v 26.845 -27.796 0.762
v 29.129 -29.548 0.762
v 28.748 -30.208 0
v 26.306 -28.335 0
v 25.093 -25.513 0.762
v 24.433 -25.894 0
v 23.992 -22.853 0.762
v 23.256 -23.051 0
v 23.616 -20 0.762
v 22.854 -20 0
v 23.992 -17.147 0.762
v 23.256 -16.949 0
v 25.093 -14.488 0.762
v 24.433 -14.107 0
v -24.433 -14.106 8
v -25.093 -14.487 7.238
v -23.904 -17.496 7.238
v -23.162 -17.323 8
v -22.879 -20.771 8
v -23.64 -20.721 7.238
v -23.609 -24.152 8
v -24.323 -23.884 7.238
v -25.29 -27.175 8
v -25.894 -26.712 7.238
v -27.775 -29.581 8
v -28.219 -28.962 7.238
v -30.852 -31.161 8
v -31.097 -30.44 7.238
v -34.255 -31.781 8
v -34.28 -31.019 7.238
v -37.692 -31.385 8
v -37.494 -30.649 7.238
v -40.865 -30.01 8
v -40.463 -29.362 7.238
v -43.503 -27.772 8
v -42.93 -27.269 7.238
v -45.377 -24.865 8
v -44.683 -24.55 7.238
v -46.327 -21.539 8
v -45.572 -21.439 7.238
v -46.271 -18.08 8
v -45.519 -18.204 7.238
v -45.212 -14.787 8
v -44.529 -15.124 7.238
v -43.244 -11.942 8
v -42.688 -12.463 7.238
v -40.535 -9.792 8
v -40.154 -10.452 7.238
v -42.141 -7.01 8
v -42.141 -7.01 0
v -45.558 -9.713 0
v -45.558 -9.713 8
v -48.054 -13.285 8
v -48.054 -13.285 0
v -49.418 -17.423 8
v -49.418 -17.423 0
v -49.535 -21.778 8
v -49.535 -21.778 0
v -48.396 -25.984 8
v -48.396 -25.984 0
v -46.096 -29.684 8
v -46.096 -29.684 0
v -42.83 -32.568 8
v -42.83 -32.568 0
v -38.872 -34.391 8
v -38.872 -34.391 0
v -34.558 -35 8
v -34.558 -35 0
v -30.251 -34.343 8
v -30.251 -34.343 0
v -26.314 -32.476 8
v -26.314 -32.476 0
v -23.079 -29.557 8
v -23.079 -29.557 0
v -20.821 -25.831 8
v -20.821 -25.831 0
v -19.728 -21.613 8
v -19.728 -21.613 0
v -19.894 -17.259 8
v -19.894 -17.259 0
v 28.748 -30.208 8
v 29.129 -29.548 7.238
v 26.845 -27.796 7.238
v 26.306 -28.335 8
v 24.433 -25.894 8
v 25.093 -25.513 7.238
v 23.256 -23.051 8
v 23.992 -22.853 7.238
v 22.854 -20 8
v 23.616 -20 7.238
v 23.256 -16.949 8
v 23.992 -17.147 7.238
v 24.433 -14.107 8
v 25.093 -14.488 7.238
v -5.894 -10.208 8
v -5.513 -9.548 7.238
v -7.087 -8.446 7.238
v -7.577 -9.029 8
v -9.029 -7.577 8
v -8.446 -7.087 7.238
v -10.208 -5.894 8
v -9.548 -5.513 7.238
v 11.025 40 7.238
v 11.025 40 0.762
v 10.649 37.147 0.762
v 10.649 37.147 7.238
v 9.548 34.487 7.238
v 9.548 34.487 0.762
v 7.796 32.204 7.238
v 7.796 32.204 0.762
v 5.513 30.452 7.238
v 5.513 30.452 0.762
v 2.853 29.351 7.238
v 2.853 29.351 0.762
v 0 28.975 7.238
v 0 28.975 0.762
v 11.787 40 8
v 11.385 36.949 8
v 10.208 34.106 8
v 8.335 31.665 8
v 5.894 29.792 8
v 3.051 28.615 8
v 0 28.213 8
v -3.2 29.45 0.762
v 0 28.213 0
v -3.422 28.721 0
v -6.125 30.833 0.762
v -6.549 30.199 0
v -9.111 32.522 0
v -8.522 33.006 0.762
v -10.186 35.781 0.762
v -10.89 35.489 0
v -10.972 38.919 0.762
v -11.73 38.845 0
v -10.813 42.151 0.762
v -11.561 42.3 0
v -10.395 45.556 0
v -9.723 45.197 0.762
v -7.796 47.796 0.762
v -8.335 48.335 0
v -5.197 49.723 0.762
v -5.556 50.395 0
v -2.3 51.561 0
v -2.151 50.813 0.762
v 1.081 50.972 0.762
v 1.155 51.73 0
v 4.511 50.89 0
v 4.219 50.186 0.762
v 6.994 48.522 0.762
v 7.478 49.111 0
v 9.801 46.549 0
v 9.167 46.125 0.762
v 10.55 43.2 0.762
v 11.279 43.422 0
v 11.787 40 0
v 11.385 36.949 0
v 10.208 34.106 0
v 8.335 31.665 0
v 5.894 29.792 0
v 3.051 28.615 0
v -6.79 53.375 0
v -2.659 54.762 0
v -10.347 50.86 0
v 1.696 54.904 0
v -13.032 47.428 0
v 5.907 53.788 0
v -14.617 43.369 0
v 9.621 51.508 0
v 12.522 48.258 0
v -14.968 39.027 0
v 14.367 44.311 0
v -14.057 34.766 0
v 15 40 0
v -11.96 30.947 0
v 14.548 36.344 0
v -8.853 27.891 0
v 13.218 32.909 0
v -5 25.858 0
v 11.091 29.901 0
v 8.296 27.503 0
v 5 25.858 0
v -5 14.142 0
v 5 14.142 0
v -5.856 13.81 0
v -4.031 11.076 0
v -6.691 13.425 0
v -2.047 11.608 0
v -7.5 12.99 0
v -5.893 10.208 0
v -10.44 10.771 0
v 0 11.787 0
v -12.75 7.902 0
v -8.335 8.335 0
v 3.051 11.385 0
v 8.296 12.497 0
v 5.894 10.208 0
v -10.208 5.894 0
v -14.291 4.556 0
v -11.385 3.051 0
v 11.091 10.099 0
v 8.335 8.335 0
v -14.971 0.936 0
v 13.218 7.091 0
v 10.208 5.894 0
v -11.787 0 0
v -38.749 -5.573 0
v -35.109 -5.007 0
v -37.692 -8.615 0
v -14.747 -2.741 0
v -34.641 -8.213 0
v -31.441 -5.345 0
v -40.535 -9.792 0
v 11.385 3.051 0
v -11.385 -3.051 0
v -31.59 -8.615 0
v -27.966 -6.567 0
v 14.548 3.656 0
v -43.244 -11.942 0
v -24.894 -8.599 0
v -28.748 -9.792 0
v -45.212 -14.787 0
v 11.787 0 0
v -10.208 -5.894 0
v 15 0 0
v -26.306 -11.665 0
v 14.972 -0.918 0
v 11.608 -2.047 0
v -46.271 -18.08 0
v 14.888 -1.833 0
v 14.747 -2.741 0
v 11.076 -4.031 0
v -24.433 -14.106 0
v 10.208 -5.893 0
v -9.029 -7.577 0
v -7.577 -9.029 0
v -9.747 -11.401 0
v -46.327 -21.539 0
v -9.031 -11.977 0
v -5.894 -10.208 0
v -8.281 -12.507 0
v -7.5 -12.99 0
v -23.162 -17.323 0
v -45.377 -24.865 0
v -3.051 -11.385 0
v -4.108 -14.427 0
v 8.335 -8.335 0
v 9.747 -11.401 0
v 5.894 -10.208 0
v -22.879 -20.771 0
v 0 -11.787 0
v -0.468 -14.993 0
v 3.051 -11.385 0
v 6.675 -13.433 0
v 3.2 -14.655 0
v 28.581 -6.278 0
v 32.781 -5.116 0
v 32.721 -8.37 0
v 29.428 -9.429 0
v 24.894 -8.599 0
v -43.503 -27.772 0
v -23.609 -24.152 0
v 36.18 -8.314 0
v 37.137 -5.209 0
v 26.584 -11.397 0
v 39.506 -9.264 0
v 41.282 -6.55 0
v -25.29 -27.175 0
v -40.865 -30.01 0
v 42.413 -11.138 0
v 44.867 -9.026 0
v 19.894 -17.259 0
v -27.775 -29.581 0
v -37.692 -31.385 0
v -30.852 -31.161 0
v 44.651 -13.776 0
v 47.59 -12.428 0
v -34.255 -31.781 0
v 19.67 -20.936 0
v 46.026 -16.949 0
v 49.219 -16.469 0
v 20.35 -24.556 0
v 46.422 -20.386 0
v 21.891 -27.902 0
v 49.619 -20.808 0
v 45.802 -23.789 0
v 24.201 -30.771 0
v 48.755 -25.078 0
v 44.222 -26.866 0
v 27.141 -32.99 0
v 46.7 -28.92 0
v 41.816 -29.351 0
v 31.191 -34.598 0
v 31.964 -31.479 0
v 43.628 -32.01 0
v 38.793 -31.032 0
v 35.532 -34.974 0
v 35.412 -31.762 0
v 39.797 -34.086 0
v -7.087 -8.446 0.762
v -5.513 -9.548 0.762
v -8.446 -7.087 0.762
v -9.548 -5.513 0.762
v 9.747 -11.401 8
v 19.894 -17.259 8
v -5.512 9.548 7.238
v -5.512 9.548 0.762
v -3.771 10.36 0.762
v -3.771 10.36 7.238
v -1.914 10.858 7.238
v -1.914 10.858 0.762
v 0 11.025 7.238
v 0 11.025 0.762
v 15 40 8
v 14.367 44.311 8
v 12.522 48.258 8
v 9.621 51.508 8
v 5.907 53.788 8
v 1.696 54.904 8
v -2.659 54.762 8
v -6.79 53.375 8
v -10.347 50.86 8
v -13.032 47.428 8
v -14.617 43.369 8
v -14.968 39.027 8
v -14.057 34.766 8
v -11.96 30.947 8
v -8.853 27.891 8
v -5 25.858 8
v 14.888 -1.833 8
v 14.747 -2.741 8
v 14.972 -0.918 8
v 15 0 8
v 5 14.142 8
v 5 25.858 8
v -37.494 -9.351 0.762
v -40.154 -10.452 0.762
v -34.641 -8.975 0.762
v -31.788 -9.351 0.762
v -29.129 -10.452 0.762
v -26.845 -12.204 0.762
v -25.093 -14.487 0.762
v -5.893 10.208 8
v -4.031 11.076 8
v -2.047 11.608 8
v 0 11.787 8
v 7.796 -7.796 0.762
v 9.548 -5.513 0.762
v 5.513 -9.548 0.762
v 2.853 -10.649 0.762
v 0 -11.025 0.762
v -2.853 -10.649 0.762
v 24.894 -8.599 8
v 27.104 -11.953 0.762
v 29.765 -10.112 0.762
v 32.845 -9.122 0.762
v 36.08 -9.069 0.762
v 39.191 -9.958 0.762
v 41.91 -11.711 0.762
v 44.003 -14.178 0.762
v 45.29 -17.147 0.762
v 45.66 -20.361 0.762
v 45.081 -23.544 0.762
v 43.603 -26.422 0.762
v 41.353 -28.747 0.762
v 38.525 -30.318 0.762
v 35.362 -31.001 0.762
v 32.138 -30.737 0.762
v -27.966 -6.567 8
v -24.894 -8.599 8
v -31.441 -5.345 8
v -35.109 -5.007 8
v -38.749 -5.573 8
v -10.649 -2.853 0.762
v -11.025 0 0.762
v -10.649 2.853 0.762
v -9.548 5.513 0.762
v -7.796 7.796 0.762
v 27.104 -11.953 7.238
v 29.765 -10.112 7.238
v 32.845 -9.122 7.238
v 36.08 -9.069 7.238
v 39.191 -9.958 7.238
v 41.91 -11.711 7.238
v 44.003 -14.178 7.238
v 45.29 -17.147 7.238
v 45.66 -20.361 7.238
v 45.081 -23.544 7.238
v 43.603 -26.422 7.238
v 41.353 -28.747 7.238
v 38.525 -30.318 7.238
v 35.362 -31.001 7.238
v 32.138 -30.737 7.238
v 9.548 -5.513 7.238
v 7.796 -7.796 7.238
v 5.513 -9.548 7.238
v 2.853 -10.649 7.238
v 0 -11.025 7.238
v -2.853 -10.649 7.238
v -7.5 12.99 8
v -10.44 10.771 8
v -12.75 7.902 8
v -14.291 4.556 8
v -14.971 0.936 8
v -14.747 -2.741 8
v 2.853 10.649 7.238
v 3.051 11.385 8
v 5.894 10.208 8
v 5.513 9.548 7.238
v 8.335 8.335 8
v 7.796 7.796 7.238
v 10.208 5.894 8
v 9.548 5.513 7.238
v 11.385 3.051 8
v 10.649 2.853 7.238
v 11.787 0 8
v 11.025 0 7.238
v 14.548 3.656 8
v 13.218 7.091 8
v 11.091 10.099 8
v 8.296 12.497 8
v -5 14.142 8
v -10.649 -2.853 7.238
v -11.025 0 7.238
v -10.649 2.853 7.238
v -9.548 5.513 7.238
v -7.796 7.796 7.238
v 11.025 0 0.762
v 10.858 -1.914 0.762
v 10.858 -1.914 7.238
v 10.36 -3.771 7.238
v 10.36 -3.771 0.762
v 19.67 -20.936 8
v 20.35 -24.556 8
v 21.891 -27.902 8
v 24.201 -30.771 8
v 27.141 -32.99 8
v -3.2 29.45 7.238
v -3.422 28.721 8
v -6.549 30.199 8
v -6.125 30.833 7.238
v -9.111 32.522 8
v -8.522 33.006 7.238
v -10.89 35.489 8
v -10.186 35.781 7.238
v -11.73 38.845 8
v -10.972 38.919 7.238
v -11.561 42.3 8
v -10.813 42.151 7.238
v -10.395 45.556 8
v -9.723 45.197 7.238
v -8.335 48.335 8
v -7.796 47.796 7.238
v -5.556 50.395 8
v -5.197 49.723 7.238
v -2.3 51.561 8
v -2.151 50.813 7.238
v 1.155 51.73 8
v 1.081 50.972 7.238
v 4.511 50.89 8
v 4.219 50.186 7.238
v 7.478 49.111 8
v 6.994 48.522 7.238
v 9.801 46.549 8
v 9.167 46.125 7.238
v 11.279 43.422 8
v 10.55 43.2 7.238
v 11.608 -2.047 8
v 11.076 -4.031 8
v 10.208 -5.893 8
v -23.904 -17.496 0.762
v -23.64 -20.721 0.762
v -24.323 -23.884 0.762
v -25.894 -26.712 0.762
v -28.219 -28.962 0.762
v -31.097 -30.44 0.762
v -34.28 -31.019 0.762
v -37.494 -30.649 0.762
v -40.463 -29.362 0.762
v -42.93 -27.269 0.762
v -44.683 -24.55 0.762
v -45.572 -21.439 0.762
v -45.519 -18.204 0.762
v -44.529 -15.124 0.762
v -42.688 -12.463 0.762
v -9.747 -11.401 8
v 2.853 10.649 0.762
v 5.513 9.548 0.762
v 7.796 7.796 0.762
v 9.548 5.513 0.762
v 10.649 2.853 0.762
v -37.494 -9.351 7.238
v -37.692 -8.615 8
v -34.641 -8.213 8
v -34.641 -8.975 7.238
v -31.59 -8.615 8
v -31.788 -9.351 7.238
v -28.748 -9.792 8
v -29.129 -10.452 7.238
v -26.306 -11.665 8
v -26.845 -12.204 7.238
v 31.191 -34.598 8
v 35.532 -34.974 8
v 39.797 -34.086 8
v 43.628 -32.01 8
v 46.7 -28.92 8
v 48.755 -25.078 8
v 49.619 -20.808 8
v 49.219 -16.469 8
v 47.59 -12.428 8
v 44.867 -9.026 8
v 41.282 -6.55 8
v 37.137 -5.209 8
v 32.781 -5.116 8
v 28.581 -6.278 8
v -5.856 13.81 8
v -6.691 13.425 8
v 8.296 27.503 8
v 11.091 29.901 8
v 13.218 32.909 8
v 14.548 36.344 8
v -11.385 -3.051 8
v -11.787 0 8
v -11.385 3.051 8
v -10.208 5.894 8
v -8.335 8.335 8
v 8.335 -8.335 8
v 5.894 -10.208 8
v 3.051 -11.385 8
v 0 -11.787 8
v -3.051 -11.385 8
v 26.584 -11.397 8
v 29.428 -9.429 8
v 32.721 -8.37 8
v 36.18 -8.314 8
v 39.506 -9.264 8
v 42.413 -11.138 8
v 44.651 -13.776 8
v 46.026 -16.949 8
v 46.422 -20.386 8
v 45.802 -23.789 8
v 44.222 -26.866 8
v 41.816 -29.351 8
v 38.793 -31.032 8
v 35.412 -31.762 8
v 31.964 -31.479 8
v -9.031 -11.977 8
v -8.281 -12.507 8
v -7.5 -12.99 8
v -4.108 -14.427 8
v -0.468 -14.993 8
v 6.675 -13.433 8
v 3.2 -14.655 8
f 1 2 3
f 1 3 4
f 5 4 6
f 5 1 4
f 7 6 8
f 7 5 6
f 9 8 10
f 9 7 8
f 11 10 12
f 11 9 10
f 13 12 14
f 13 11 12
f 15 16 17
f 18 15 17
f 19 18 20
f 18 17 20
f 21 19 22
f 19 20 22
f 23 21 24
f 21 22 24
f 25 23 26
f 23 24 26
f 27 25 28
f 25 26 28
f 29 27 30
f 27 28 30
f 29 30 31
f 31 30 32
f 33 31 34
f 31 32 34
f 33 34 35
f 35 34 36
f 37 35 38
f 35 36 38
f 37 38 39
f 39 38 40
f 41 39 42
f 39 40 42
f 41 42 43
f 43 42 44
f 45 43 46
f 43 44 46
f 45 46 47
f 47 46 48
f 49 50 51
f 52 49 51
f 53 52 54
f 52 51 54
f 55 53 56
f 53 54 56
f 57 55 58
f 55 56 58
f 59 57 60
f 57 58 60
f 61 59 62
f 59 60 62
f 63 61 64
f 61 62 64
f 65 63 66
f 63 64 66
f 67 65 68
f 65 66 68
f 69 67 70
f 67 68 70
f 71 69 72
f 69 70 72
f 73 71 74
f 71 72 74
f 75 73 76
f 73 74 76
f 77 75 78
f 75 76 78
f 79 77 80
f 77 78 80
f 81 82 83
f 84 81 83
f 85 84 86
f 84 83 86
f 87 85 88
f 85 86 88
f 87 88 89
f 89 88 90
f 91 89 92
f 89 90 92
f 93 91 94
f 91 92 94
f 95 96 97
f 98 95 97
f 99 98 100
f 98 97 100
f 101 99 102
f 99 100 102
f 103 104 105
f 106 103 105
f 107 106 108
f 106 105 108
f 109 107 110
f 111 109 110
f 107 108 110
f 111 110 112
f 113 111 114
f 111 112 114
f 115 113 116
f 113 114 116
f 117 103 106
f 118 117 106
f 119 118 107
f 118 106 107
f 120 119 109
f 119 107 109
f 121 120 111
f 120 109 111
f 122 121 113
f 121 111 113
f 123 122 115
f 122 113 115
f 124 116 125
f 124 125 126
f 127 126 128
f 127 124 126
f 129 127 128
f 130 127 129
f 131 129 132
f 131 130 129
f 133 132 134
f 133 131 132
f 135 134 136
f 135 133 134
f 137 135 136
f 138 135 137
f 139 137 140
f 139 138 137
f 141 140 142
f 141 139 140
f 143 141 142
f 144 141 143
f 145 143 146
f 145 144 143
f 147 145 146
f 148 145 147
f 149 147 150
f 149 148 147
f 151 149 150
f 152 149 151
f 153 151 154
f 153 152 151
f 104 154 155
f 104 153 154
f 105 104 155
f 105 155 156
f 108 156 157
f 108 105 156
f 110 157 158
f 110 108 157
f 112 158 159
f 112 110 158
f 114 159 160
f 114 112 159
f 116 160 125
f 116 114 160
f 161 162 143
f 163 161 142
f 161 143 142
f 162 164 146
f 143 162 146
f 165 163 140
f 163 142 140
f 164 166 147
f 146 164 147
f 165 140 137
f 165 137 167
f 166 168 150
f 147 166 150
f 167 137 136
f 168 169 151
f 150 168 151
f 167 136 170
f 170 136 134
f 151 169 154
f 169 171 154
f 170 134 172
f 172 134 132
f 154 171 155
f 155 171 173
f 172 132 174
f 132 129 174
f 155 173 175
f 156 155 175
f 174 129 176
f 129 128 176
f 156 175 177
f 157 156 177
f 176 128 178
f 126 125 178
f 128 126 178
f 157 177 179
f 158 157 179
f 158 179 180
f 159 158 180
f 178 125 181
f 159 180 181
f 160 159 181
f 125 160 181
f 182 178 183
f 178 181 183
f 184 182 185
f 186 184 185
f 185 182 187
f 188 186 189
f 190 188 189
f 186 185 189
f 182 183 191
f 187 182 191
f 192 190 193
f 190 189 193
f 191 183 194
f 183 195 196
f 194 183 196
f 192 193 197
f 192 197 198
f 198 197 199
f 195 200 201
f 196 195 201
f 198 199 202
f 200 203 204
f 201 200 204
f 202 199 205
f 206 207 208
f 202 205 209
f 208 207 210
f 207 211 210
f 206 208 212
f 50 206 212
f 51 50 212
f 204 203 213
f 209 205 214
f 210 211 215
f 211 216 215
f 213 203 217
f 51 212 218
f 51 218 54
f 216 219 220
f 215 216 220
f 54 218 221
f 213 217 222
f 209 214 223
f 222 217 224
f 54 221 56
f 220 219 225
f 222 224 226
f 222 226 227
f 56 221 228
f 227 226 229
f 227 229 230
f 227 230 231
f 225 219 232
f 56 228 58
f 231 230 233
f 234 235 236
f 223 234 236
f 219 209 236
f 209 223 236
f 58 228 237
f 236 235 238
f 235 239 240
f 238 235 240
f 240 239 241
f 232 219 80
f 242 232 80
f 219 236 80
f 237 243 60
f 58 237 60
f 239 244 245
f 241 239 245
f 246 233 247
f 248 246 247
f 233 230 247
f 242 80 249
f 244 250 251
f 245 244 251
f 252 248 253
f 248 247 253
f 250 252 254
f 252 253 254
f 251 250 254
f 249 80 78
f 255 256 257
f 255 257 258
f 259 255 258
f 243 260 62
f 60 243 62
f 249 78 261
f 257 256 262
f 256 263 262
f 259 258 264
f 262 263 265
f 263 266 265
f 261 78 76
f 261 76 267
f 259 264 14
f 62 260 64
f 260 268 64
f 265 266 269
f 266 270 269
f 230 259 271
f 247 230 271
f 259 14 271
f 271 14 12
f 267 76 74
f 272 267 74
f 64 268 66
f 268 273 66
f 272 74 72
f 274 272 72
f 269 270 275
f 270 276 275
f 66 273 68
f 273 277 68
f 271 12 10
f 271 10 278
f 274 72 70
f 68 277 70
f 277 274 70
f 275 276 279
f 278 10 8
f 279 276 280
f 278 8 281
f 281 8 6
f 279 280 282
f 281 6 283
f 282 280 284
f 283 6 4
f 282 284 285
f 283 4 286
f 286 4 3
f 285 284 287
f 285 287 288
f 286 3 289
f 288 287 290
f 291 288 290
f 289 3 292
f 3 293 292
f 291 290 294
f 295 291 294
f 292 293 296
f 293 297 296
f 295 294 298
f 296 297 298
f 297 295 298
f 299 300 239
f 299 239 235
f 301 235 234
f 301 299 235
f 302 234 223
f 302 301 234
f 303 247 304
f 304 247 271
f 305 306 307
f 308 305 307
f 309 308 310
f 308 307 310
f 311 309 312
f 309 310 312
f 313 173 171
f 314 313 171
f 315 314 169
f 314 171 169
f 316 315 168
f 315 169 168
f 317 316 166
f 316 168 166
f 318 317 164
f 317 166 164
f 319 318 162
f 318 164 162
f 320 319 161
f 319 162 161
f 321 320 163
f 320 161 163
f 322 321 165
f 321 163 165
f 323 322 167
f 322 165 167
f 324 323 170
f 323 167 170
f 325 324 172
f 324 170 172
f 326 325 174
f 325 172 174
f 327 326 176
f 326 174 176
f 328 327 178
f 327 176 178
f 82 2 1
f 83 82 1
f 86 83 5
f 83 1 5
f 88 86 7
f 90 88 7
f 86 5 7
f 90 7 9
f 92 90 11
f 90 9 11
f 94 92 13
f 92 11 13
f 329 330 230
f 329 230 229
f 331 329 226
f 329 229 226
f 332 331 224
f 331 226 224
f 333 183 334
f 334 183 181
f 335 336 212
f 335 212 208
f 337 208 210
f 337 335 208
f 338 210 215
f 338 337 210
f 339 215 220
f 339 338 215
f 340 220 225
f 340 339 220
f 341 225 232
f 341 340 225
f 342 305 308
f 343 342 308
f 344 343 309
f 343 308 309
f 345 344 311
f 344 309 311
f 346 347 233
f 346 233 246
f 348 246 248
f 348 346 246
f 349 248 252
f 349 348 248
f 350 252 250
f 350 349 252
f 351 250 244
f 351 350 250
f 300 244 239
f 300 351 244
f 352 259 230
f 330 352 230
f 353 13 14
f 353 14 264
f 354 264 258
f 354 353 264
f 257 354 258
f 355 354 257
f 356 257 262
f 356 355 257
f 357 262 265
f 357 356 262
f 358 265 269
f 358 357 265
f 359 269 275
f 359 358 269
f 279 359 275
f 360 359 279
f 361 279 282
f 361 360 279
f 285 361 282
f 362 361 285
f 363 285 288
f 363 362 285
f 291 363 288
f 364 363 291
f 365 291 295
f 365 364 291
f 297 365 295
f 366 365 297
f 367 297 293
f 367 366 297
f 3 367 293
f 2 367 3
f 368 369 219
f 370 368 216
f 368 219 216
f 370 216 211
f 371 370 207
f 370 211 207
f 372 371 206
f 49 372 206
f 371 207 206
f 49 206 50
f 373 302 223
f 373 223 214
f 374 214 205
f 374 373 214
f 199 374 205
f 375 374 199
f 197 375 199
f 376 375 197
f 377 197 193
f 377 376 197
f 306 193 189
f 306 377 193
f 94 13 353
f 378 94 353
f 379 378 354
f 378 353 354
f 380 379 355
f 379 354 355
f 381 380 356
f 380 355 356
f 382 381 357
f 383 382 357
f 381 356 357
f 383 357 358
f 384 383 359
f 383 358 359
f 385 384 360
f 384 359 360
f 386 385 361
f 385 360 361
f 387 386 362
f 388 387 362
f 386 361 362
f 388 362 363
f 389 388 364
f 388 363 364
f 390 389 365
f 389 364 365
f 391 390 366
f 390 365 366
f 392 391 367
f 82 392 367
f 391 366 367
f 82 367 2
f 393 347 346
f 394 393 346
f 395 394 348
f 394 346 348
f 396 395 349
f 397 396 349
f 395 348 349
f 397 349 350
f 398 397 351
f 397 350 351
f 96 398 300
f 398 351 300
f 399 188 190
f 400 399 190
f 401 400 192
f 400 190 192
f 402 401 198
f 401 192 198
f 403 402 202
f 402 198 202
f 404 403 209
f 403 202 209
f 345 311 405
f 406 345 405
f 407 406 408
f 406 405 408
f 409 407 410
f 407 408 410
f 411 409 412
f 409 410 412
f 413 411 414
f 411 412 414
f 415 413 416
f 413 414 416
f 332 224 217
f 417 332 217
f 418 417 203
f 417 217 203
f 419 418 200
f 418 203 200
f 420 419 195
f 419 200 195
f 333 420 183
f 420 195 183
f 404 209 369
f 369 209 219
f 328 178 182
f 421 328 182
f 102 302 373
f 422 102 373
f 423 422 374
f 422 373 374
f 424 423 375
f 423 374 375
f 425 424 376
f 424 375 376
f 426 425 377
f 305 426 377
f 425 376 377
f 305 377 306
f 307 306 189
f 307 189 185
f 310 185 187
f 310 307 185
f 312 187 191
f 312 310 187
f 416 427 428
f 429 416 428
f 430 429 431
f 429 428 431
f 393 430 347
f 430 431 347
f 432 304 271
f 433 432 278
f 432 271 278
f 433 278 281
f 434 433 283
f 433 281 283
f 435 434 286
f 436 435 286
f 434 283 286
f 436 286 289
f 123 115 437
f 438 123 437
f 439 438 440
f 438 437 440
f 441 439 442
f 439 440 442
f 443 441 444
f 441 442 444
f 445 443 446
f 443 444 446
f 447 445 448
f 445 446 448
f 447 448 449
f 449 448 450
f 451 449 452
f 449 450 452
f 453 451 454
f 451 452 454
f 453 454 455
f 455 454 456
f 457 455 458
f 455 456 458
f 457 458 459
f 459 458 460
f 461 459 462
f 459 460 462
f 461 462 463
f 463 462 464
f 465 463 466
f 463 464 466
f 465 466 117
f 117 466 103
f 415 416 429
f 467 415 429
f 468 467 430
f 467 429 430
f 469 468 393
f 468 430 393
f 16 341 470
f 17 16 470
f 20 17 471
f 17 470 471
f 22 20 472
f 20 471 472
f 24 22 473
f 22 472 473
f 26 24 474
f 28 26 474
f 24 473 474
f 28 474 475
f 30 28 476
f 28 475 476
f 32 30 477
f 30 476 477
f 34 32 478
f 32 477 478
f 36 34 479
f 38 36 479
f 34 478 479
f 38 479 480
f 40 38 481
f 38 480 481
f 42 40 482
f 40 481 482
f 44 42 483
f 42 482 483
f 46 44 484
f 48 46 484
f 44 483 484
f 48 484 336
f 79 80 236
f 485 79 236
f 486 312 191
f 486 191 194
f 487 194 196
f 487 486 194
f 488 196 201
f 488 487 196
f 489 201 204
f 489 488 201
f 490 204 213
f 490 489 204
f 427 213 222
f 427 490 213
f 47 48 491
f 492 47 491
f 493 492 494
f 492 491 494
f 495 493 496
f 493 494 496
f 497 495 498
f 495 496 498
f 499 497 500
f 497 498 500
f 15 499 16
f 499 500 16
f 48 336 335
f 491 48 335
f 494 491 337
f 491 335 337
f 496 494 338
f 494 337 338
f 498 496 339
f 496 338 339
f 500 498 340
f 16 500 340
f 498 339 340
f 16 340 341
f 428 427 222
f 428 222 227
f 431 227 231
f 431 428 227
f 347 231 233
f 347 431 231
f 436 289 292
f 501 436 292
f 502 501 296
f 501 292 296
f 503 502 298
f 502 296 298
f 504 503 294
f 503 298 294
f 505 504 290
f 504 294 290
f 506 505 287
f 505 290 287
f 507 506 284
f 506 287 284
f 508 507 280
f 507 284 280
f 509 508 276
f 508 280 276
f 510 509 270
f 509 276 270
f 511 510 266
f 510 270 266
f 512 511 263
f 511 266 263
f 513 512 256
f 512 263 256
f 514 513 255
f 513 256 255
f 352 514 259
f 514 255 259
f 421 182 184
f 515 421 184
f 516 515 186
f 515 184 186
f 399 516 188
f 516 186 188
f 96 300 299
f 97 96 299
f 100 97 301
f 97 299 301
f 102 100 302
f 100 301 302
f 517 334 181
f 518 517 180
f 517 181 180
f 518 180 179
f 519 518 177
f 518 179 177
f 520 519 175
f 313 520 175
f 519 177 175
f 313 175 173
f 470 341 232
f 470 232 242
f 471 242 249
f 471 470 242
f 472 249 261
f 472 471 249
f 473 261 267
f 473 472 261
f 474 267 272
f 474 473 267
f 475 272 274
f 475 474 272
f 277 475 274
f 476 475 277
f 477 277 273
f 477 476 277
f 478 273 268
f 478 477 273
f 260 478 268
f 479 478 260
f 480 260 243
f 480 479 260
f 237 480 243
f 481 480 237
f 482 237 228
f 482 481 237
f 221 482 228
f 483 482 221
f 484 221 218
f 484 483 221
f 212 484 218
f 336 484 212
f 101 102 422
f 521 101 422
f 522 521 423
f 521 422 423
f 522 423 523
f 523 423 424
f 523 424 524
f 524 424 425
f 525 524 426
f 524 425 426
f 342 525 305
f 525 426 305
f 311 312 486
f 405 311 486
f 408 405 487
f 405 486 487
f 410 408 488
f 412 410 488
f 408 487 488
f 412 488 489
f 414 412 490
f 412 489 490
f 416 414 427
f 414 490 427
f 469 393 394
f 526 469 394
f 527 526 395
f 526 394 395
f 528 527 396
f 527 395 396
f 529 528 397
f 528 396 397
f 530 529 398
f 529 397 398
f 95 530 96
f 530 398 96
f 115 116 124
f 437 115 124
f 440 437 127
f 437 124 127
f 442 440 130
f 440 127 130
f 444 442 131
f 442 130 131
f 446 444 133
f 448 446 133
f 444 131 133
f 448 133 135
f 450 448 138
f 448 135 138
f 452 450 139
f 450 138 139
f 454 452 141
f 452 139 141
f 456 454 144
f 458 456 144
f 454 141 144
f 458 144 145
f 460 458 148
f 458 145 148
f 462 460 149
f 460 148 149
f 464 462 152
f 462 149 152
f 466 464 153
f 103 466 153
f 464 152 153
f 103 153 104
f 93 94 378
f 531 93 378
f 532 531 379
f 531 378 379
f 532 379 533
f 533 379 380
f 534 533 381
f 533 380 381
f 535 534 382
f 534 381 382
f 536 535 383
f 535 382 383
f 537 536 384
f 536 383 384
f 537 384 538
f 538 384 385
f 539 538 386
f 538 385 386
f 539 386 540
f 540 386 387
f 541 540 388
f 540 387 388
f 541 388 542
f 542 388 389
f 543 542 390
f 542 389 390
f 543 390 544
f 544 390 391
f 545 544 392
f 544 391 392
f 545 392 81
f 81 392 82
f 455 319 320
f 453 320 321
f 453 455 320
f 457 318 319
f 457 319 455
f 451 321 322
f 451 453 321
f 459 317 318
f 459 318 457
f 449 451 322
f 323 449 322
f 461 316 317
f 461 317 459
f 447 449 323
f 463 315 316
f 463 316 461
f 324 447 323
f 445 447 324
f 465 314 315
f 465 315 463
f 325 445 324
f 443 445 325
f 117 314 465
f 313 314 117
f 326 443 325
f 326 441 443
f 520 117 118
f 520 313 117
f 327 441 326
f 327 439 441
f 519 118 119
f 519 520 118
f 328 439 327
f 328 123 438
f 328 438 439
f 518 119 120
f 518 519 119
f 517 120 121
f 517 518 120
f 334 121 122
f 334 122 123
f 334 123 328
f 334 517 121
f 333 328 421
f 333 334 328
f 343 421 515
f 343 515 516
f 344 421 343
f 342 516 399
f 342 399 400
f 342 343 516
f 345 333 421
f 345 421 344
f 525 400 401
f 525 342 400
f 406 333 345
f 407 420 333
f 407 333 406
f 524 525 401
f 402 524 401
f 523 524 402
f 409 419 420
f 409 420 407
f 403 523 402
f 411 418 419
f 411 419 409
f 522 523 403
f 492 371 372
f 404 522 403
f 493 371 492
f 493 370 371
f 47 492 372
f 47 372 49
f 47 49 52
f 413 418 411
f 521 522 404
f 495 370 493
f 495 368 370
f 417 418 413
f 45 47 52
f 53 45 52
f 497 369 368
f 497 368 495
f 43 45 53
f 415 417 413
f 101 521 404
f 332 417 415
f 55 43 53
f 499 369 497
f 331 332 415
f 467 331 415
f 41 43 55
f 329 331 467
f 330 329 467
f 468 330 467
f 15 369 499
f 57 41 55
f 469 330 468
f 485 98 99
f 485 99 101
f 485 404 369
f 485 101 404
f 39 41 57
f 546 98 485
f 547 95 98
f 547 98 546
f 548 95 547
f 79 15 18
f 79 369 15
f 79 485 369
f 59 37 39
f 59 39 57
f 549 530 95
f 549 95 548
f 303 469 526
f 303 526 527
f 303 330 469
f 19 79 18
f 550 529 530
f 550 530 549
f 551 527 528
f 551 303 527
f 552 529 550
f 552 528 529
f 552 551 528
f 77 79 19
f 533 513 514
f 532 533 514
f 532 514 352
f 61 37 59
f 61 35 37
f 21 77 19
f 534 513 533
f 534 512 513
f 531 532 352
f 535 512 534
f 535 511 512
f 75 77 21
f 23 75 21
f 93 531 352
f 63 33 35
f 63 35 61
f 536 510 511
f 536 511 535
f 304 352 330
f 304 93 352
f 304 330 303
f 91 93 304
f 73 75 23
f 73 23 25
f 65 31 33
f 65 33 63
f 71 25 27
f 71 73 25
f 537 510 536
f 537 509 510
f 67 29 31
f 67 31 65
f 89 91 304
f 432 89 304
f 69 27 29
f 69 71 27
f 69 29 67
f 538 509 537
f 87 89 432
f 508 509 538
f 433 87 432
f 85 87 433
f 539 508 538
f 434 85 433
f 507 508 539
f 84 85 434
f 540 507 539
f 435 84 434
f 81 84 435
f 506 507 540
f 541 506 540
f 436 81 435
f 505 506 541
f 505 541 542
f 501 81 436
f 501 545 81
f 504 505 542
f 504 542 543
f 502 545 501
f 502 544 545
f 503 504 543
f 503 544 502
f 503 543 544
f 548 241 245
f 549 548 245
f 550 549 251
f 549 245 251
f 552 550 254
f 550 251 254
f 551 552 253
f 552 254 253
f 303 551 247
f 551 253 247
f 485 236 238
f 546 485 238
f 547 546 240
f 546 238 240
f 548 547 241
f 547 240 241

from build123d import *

# Parameters (mm, degrees)
F1_DEPTH = 8
F3_COUNT = 3
F4_SIZE  = 0.762


with BuildPart() as f1:
    # F0 (on Top) → F1 (new body)
    with BuildSketch(Plane.XY):
        with BuildLine():
            ThreePointArc((-4.9999998882, 25.8578643368), (-2.5365296225, 25.2160215952), (0, 25))
            ThreePointArc((0, 25), (2.5365296809, 25.2160216052), (5, 25.8578643763))
            ThreePointArc((5, 25.8578643763), (12.2474487139, 31.3397459622), (15, 40))
            ThreePointArc((15, 40), (-8.6602540862, 52.2474486797), (-4.9999998882, 25.8578643368))
        make_face()
        with BuildLine():
            ThreePointArc((11.025, 40), (7.7958522626, 32.2041477374), (0, 28.975))
            ThreePointArc((0, 28.975), (-7.7958522626, 47.7958522626), (11.025, 40))
        make_face(mode=Mode.SUBTRACT)
        with BuildLine():
            Line((0, 25), (0, 15))
            ThreePointArc((0, 15), (2.5365296809, 14.7839783948), (5, 14.1421356237))
            Line((5, 14.1421356237), (5, 25.8578643763))
            ThreePointArc((5, 25.8578643763), (2.5365296809, 25.2160216052), (0, 25))
        make_face()
        with BuildLine():
            ThreePointArc((-4.9999998882, 14.1421356632), (-2.5365296225, 14.7839784048), (0, 15))
            Line((0, 15), (0, 25))
            ThreePointArc((0, 25), (-2.5365296225, 25.2160215952), (-4.9999998882, 25.8578643368))
            Line((-4.9999998882, 25.8578643368), (-4.9999998882, 14.1421356632))
        make_face()
        with BuildLine():
            ThreePointArc((5, 14.1421356237), (2.5365296809, 14.7839783948), (0, 15))
            ThreePointArc((0, 15), (-2.5365296225, 14.7839784048), (-4.9999998882, 14.1421356632))
            ThreePointArc((-4.9999998882, 14.1421356632), (-8.6602540862, -12.2474486797), (15, 0))
            ThreePointArc((15, 0), (12.2474487139, 8.6602540378), (5, 14.1421356237))
        make_face()
        with BuildLine():
            ThreePointArc((0, 11.025), (7.7958522626, 7.7958522626), (11.025, 0))
            ThreePointArc((11.025, 0), (-7.7958522626, -7.7958522626), (0, 11.025))
        make_face(mode=Mode.SUBTRACT)
    extrude(amount=F1_DEPTH)

    # F3: F1 ×3 about axis
    f3_axis = Axis((0, 0, 23.3244411647), (0, 0, 1))


with BuildPart() as f1_1:
    add(f1.part)
    for i in range(1, F3_COUNT):
        add(f1.part.rotate(f3_axis, i * 360 / F3_COUNT))

    # F4
    f4_edges = [f1_1.edges().sort_by_distance(p)[0] for p in [
        (0, 51.025, 8),
        (0, -11.025, 8),
        (-44.188946, -25.5125, 8),
        (44.188946, -25.5125, 8),
        (-44.188946, -25.5125, 0),
        (0, -11.025, 0),
        (44.188946, -25.5125, 0),
        (0, 51.025, 0),
    ]]
    chamfer(f4_edges, length=F4_SIZE)


solid = f1_1.part
